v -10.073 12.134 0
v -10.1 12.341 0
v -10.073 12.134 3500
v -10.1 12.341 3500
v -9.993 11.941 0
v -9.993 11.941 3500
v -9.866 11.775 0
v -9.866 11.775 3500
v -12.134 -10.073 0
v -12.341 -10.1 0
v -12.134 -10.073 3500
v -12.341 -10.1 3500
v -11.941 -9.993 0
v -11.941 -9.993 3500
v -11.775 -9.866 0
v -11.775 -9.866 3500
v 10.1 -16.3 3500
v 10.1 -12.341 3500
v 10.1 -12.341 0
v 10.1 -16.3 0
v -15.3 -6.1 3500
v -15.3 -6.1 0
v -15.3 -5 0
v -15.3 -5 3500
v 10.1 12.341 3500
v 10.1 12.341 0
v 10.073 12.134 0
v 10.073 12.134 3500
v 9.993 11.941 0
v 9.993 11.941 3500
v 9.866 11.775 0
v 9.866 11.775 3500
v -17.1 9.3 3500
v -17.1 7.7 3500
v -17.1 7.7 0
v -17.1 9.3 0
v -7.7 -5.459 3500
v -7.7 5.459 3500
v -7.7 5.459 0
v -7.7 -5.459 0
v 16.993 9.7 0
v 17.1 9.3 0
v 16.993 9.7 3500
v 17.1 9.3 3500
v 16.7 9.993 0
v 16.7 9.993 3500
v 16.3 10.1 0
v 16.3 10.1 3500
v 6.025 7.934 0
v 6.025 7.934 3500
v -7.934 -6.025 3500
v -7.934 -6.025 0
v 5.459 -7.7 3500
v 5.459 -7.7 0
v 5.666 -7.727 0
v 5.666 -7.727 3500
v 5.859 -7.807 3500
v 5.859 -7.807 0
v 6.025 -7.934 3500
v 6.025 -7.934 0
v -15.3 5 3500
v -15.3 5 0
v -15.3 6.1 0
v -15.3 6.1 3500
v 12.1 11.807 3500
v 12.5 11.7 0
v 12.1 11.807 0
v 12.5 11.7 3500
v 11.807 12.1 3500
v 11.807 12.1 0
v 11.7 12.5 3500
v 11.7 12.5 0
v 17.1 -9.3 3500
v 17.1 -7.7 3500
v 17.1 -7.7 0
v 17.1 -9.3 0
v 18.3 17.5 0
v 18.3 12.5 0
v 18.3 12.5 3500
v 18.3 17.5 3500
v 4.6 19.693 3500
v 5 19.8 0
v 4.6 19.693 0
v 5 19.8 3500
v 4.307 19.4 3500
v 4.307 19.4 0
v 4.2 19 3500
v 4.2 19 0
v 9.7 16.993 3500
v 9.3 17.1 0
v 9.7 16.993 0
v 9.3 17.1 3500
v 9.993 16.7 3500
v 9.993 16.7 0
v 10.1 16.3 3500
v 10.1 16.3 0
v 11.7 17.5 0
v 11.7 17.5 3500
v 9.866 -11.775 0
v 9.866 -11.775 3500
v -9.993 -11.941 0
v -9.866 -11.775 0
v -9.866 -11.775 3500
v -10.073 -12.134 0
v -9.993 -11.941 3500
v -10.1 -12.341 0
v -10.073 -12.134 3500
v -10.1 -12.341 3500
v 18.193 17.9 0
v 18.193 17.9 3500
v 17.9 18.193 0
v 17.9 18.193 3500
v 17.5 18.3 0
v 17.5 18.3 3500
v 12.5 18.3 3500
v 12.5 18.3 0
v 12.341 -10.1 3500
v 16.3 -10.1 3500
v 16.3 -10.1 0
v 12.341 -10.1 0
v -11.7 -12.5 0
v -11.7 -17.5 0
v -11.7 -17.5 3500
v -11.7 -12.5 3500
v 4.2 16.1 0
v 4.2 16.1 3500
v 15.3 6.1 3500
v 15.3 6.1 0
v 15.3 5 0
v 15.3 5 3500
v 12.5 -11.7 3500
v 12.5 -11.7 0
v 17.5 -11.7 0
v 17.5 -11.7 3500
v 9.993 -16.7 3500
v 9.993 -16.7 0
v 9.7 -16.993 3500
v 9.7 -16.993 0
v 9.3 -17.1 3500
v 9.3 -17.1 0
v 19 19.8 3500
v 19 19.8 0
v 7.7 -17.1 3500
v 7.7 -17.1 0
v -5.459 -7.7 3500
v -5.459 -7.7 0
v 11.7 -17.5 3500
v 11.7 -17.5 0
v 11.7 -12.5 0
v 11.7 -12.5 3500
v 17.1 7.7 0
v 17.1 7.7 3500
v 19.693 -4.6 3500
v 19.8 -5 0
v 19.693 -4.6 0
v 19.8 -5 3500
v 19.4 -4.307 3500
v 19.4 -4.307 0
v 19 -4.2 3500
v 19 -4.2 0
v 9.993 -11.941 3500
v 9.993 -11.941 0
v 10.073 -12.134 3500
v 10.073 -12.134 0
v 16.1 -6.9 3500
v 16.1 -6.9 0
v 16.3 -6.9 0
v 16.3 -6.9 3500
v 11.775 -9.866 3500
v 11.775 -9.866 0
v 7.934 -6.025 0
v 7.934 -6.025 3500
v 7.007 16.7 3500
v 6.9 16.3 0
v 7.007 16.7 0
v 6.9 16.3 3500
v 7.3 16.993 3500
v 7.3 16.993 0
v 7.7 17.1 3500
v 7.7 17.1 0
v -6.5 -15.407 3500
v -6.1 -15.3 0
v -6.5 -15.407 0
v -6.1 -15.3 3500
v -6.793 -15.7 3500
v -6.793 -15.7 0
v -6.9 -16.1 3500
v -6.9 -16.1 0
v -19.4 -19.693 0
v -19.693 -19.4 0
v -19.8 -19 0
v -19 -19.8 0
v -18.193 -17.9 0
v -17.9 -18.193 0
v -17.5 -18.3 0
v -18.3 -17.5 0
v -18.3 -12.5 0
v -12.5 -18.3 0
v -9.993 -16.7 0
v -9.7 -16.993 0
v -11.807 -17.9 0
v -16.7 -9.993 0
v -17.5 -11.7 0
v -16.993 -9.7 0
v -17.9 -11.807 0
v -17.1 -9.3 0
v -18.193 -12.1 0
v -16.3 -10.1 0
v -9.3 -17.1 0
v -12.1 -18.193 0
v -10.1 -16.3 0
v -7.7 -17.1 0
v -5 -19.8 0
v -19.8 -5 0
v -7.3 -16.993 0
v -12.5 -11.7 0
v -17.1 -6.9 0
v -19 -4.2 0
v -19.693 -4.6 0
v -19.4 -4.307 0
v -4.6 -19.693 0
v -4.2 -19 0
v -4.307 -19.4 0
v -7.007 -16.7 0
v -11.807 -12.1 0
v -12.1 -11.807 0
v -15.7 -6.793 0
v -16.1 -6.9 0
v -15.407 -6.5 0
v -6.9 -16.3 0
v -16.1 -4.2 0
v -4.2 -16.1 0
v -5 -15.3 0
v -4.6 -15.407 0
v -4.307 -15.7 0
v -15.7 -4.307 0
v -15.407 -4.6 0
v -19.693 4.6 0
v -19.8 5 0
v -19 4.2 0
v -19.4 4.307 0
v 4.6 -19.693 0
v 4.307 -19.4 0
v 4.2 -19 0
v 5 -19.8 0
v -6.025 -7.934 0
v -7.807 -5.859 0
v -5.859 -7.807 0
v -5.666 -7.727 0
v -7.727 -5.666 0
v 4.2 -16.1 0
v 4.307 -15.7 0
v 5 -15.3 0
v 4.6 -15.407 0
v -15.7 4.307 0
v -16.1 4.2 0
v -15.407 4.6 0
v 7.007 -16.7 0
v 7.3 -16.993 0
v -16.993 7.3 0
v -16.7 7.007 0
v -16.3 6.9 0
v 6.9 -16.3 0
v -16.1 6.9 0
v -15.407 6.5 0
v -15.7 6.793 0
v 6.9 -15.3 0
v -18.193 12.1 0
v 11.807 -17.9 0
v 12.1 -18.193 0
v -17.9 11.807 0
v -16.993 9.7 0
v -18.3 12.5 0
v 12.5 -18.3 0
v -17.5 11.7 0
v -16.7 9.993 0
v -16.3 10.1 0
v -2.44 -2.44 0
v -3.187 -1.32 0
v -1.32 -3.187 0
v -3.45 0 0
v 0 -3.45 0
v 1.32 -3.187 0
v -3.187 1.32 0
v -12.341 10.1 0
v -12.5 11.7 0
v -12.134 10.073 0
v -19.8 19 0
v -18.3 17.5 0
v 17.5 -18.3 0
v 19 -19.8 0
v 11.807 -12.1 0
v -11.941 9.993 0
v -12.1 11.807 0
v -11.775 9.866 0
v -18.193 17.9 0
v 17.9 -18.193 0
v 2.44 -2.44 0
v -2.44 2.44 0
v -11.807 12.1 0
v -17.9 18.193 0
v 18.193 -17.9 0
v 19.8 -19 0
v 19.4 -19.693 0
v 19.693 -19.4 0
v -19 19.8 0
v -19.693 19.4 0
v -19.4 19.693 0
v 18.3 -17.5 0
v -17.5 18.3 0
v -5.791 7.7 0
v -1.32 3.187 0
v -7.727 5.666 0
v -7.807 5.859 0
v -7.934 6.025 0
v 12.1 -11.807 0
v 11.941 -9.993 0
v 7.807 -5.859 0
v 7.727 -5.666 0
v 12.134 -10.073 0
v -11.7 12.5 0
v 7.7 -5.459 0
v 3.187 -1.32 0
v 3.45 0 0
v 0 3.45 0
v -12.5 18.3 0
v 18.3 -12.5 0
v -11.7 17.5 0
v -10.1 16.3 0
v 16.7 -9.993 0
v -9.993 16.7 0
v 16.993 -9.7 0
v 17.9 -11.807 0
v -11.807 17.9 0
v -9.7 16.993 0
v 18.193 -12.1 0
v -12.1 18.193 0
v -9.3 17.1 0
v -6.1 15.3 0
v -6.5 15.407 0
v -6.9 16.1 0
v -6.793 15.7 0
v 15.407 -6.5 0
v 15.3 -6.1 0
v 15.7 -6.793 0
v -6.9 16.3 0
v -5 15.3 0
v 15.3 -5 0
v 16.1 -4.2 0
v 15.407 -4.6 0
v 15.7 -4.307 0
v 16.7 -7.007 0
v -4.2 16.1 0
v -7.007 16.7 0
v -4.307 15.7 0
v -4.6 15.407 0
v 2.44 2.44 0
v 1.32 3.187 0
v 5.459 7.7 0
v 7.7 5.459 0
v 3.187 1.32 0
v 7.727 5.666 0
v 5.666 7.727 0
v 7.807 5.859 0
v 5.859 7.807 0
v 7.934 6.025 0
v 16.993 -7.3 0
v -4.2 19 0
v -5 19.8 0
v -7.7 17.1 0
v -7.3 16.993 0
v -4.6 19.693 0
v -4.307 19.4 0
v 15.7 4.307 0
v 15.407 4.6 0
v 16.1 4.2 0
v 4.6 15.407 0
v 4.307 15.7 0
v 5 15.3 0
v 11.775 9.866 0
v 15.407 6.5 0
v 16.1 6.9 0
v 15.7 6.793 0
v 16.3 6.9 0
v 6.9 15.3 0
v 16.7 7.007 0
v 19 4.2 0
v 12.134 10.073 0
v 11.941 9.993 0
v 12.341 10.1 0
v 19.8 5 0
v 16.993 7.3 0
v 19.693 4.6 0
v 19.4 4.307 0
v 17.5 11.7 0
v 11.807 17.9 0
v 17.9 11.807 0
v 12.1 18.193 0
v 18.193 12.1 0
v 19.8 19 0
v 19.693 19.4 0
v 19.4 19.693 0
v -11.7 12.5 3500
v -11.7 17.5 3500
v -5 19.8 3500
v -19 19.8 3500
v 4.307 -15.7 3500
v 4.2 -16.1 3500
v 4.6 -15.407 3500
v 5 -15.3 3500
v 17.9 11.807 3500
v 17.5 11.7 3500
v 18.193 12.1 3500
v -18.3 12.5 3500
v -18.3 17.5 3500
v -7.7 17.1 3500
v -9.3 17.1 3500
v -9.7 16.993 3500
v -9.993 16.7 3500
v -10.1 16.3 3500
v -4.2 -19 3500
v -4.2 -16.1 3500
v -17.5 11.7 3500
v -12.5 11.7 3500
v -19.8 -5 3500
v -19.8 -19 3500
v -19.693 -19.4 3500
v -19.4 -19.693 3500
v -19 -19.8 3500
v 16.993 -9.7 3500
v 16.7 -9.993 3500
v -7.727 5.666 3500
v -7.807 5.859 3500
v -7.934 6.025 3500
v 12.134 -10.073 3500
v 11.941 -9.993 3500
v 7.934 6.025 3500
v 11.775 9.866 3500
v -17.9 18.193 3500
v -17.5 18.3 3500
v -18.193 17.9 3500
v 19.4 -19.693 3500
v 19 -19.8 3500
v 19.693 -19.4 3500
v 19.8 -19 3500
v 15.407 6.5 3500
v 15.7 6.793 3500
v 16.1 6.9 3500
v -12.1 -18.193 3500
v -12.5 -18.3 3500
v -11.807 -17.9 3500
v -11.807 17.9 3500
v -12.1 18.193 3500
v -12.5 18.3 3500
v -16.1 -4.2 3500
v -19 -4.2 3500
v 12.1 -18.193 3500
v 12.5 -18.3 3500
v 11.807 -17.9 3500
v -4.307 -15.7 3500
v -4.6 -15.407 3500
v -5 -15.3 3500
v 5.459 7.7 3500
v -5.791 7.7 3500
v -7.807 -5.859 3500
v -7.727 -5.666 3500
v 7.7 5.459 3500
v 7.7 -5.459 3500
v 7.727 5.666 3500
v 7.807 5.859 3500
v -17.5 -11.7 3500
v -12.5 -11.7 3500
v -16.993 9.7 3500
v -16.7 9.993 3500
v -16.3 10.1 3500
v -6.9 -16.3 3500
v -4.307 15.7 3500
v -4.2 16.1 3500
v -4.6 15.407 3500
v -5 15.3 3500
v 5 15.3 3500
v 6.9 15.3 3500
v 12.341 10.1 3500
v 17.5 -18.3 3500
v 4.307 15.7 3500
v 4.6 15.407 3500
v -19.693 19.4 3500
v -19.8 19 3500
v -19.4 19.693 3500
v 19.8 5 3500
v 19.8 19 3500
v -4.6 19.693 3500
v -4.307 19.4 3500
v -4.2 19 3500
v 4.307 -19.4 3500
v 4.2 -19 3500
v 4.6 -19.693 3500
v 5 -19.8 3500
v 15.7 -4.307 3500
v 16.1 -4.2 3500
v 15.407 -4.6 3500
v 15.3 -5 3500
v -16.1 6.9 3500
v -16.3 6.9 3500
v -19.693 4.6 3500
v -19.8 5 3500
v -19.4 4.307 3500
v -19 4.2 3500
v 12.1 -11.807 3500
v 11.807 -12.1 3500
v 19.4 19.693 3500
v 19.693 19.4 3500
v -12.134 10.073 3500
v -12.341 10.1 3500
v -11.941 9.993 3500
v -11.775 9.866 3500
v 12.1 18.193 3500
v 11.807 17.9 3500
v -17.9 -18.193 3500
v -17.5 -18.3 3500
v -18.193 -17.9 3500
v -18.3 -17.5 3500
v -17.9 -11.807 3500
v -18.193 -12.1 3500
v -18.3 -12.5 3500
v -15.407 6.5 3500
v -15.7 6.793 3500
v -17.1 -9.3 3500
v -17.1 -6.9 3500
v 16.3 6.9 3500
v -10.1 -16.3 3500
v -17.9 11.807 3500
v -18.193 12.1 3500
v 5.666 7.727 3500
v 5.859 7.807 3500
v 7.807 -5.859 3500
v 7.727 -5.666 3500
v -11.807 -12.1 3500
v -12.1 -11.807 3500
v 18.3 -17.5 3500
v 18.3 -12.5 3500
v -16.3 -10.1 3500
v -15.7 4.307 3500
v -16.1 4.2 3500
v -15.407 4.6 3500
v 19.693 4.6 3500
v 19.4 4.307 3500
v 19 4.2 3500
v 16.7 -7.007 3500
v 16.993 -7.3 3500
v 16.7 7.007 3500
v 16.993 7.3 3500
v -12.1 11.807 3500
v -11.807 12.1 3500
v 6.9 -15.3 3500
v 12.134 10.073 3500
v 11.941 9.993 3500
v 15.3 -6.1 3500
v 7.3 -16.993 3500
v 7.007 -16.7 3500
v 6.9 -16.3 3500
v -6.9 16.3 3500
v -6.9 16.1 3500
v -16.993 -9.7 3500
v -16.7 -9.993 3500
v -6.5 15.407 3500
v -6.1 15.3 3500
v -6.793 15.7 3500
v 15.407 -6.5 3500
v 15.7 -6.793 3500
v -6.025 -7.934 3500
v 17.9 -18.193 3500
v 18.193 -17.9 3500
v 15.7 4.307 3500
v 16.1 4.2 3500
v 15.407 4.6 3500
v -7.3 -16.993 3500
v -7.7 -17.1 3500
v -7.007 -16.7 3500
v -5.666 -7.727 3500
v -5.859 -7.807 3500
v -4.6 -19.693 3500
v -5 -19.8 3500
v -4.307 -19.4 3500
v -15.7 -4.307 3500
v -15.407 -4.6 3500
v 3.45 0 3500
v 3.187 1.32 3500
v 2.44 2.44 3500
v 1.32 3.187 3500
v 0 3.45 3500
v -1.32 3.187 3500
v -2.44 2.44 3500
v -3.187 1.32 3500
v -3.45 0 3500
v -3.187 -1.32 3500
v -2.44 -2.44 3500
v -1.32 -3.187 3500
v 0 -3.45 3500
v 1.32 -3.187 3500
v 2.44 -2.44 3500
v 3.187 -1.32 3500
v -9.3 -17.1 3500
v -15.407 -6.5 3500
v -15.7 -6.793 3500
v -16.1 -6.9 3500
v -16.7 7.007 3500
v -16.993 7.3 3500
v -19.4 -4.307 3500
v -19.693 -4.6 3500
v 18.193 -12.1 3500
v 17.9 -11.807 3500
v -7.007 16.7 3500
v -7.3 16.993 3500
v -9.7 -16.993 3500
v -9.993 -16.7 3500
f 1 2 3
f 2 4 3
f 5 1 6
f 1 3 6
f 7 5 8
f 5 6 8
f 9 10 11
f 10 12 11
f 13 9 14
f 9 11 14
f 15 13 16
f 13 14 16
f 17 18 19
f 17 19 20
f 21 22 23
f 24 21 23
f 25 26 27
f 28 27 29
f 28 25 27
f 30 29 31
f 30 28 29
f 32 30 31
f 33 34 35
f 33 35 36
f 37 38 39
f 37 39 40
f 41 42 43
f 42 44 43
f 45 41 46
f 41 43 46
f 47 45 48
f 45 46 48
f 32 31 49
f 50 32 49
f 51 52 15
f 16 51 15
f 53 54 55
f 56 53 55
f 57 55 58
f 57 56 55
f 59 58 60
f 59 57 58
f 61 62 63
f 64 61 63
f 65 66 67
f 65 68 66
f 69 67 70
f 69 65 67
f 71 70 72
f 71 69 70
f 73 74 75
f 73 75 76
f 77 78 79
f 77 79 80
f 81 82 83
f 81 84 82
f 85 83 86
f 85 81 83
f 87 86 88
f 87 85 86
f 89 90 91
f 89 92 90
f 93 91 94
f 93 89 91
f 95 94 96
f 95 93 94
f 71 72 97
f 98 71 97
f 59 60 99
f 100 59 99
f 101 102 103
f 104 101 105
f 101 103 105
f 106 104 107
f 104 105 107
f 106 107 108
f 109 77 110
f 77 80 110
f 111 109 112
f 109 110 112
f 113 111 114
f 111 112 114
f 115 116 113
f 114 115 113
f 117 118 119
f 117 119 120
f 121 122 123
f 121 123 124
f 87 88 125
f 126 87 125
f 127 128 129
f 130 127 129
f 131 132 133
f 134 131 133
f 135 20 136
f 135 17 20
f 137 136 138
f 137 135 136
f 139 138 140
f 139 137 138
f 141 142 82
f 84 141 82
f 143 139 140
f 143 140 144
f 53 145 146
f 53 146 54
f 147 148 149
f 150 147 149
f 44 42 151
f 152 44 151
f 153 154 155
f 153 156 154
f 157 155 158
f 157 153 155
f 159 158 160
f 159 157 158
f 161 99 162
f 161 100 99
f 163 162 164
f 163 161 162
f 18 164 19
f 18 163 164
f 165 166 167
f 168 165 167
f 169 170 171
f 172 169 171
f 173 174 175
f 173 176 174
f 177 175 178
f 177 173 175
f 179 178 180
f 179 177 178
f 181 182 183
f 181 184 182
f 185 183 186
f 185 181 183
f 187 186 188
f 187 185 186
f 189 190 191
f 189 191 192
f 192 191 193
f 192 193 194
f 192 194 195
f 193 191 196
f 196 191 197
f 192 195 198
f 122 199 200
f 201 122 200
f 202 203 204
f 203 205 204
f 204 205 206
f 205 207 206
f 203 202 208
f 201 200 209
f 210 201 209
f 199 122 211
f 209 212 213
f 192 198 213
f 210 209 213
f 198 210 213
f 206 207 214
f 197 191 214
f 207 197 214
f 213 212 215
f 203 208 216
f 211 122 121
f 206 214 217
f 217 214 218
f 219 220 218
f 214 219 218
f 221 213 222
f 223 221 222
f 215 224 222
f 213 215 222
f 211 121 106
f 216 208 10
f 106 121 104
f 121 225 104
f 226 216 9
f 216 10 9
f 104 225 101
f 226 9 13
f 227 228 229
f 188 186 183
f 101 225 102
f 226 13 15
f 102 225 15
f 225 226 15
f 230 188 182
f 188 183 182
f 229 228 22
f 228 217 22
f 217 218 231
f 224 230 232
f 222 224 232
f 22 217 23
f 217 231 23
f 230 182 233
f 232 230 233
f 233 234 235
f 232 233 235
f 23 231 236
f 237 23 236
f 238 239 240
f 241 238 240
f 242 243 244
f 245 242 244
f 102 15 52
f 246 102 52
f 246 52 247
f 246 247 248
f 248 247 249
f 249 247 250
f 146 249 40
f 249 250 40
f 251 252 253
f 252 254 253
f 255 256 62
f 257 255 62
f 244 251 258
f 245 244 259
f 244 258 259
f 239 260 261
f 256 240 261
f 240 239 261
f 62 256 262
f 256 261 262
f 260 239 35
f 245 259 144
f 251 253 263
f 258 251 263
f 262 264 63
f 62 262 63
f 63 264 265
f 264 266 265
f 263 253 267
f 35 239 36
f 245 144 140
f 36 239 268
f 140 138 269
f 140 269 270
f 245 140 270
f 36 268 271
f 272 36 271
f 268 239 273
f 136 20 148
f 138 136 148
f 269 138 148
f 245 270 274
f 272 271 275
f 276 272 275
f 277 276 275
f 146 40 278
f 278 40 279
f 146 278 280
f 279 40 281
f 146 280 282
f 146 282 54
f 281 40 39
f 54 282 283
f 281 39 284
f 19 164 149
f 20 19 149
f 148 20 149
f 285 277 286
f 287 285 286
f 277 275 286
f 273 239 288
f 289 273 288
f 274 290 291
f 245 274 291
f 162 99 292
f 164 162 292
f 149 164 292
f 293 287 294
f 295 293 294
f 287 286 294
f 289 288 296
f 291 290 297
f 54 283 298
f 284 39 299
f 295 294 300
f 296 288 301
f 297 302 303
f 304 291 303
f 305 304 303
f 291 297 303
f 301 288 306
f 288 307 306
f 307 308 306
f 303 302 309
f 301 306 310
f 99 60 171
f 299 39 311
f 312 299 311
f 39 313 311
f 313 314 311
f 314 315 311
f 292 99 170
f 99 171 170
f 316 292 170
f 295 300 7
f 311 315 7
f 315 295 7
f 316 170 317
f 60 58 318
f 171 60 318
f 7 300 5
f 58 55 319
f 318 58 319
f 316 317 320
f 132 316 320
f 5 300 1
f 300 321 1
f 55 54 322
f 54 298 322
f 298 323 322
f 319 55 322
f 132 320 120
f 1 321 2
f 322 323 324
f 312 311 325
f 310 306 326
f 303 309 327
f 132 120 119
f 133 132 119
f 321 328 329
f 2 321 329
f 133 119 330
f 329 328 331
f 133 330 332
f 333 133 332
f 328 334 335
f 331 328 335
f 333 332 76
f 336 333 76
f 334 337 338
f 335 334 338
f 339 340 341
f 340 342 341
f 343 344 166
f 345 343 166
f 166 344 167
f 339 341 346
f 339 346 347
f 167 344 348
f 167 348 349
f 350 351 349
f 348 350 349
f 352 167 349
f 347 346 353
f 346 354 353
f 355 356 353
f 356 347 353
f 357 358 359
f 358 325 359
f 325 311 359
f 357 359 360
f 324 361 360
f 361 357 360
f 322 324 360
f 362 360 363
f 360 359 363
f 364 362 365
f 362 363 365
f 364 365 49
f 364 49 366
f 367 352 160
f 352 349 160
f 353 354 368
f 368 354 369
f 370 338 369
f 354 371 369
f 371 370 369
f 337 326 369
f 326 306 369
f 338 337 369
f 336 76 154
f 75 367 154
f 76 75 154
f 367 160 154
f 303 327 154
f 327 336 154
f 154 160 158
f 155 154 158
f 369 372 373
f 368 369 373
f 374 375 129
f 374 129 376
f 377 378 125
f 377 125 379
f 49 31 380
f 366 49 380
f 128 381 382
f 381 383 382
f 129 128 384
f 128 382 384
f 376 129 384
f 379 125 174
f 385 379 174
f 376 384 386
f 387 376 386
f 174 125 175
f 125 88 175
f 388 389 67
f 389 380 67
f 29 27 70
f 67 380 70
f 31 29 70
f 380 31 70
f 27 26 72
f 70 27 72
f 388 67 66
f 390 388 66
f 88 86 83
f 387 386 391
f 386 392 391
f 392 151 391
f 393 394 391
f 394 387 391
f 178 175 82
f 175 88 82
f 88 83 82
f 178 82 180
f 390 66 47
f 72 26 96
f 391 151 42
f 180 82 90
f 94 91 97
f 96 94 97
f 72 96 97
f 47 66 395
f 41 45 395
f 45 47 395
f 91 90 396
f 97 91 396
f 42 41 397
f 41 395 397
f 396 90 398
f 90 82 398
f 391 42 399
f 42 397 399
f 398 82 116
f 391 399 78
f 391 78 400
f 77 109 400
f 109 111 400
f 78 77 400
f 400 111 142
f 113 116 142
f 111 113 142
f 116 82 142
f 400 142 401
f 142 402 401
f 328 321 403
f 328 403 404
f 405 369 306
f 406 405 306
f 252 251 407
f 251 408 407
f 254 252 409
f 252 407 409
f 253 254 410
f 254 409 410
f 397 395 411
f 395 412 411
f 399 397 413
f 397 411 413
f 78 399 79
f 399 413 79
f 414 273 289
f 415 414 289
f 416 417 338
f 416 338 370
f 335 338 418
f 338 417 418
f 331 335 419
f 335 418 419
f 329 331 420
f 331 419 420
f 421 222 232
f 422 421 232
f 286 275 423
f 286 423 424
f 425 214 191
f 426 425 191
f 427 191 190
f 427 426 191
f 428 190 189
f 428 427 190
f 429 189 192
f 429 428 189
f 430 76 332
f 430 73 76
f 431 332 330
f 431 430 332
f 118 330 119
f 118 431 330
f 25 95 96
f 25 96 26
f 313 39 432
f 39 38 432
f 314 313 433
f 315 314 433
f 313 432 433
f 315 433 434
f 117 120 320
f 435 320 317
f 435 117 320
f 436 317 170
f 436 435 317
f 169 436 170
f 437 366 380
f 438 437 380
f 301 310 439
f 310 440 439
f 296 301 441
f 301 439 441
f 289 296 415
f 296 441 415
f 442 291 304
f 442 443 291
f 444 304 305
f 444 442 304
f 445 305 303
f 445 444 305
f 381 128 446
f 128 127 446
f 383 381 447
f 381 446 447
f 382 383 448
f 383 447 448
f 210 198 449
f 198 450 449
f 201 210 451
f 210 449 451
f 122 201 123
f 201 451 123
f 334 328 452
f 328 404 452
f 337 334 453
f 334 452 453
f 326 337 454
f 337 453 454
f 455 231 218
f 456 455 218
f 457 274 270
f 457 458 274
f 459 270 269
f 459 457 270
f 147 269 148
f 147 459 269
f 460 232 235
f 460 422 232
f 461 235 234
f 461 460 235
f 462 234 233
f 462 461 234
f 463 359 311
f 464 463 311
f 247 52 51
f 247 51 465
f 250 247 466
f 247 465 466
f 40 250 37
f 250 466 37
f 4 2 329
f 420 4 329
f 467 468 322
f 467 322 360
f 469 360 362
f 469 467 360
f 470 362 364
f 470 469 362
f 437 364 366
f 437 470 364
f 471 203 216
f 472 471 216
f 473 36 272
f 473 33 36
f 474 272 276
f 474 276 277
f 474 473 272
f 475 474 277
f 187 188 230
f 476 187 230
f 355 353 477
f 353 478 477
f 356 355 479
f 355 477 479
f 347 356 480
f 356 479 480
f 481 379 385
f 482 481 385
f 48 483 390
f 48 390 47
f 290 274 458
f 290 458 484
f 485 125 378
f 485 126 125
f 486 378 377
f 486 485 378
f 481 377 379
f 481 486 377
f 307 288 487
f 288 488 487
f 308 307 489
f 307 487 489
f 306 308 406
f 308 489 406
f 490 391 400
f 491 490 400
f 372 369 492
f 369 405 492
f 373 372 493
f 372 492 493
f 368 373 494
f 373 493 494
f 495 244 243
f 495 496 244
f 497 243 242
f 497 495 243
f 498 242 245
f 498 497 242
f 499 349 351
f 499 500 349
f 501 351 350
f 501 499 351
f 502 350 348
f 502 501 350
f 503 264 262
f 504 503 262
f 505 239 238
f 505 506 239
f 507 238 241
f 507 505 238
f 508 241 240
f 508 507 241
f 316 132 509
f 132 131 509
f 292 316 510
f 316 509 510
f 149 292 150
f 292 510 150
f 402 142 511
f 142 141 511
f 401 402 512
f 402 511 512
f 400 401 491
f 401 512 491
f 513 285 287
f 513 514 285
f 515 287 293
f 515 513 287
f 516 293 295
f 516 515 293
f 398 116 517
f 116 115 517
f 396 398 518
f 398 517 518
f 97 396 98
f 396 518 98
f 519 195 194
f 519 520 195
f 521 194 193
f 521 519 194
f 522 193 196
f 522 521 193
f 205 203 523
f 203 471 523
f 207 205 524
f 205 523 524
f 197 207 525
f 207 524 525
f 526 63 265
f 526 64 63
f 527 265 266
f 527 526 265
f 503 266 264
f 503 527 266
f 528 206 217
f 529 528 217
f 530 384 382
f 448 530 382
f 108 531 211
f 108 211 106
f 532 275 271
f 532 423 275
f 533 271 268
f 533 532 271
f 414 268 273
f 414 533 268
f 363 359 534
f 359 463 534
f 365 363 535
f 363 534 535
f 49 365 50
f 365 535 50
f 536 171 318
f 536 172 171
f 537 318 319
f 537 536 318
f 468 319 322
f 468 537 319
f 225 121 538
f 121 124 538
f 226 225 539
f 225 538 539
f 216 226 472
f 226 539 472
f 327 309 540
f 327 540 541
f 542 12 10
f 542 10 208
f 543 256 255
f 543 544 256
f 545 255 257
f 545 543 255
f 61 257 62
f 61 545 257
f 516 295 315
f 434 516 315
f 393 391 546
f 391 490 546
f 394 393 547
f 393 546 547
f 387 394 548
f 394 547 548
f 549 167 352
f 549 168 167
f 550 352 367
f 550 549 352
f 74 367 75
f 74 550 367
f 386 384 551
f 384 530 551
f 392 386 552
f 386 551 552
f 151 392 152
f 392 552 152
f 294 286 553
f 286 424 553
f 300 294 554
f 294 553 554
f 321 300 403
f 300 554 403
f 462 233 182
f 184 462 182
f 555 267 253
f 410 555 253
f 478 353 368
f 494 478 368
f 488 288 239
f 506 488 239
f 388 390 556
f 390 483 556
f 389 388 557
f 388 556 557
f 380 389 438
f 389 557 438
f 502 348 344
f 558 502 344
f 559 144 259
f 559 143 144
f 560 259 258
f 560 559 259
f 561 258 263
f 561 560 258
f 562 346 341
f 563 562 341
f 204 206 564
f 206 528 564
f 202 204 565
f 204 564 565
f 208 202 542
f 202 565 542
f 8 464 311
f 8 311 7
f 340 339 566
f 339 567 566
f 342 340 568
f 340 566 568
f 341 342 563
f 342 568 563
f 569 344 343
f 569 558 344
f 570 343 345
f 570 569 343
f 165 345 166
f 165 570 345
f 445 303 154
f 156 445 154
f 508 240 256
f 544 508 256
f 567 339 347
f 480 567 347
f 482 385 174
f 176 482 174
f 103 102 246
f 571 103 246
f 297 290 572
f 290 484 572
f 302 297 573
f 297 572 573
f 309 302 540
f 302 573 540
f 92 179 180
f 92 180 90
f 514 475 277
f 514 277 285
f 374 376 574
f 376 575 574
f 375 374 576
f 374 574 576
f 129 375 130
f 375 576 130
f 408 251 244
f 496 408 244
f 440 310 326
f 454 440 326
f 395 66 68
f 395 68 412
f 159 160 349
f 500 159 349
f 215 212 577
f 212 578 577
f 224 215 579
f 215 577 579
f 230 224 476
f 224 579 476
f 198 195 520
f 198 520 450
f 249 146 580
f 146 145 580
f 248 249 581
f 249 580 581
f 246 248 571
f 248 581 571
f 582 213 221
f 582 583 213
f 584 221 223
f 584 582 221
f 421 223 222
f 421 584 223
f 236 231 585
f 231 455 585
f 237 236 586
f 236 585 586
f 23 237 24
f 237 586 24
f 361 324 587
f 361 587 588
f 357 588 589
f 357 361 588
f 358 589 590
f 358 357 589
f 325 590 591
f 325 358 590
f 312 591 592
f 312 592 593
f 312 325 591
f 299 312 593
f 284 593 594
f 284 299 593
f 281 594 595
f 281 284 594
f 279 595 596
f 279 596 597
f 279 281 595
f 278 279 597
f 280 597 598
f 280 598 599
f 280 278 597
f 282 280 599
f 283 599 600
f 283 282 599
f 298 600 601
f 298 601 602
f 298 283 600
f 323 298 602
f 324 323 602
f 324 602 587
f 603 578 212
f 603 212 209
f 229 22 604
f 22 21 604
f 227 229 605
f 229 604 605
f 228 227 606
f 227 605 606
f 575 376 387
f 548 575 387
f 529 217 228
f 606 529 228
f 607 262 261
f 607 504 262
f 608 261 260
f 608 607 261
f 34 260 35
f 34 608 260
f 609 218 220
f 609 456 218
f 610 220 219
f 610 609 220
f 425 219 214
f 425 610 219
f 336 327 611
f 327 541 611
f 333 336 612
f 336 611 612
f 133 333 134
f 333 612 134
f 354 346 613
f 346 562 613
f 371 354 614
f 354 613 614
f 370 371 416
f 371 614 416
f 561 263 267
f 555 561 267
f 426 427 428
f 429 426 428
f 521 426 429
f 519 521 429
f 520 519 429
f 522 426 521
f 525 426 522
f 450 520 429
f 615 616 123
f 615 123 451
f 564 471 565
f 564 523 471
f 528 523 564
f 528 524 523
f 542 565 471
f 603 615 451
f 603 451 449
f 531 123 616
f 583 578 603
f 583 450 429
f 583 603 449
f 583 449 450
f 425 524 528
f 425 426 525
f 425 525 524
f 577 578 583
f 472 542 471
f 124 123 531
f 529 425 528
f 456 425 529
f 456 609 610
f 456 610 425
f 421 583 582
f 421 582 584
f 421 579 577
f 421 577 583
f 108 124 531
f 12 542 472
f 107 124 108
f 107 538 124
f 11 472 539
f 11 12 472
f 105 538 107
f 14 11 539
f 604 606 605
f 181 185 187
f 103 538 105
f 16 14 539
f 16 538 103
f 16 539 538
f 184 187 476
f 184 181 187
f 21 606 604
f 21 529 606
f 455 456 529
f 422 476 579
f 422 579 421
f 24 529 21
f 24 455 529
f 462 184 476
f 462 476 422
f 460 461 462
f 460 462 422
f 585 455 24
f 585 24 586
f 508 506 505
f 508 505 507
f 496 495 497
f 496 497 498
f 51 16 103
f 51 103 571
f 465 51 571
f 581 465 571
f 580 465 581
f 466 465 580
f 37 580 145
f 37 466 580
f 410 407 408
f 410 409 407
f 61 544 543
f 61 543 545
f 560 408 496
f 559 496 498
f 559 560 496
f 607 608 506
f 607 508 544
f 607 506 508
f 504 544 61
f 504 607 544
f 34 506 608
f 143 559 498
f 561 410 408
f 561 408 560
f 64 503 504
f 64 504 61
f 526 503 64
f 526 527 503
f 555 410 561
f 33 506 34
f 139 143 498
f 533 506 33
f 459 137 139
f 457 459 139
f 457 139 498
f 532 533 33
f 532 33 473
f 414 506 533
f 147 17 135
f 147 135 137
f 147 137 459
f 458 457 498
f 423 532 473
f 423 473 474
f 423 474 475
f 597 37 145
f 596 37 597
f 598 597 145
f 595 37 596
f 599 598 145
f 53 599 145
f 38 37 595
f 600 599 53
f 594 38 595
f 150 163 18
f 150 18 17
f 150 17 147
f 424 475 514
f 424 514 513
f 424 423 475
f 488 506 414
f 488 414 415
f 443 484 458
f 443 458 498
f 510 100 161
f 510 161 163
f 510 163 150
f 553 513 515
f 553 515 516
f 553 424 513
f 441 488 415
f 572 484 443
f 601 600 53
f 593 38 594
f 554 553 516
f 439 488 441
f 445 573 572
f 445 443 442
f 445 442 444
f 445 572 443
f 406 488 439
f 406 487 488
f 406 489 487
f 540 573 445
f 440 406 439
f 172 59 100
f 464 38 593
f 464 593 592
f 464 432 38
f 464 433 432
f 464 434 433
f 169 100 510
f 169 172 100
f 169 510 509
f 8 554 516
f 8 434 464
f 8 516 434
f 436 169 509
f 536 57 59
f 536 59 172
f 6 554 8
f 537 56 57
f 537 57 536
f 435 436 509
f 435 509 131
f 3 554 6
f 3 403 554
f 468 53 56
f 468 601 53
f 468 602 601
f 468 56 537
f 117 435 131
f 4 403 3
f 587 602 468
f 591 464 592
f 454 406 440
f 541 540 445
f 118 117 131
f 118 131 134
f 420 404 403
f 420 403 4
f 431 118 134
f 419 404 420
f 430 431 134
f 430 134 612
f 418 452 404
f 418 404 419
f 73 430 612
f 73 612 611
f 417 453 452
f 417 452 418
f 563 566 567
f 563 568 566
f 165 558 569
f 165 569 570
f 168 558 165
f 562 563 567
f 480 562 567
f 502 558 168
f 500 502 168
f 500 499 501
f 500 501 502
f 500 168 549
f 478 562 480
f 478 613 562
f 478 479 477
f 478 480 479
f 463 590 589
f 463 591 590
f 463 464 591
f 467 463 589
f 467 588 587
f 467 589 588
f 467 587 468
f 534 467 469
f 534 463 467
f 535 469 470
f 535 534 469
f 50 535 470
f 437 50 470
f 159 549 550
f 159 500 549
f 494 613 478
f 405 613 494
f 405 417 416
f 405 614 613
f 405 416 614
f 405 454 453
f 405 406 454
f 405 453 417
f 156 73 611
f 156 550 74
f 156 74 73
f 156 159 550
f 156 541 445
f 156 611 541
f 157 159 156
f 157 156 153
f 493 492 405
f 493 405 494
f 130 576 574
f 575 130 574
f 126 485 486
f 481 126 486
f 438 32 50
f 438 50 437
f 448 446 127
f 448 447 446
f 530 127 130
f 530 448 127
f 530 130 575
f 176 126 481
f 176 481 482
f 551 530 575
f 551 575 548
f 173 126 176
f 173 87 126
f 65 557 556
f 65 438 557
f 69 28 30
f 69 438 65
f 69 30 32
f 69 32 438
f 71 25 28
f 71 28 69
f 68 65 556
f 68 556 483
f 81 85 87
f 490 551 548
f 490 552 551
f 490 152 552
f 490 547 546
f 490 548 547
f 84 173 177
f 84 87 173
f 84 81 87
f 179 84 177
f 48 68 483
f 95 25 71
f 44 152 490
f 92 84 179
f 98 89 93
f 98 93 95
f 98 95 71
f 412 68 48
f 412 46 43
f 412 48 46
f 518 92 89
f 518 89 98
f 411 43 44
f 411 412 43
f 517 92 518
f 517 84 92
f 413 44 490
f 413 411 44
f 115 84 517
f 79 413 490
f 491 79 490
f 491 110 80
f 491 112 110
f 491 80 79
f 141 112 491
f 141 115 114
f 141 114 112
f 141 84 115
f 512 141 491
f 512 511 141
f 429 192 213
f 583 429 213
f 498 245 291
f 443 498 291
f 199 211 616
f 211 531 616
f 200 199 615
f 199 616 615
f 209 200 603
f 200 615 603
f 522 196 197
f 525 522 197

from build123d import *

# Parameters (mm, degrees)
SKETCH1_W           = 6.6
SKETCH1_H           = 6.6
SKETCH1_R           = 3.45
BOSS_EXTRUDE3_DEPTH = 3500
FILLET1_R           = 0.8


with BuildPart() as part:
    # Sketch1 → Boss-Extrude3 (new body)
    # profile 1 of 9: a face of its own
    with BuildSketch(Plane.XY):
        Polygon((19.8, 19.8), (4.2, 19.8), (4.2, 15.3), (6.9, 15.3), (6.9, 17.1), (10.1, 17.1), (10.1, 12.009188309), (5.790811691, 7.7), (7.7, 7.7), (7.7, 5.790811691), (12.009188309, 10.1), (17.1, 10.1), (17.1, 6.9), (15.3, 6.9), (15.3, 4.2), (19.8, 4.2), align=None)
        with Locations((15, 15)):
            Rectangle(SKETCH1_W, SKETCH1_H, mode=Mode.SUBTRACT)
    # profile 2 of 9: a face of its own
    with BuildSketch(Plane.XY):
        Polygon((4.2, -15.3), (4.2, -19.8), (19.8, -19.8), (19.8, -4.2), (15.3, -4.2), (15.3, -6.9), (17.1, -6.9), (17.1, -10.1), (12.009188309, -10.1), (7.7, -5.790811691), (7.7, -7.7), (5.790811691, -7.7), (10.1, -12.009188309), (10.1, -17.1), (6.9, -17.1), (6.9, -15.3), align=None)
        with Locations((15, -15)):
            Rectangle(SKETCH1_W, SKETCH1_H, mode=Mode.SUBTRACT)
    # profile 3 of 9: a face of its own
    with BuildSketch(Plane.XY):
        Polygon((-15.3, -4.2), (-19.8, -4.2), (-19.8, -19.8), (-4.2, -19.8), (-4.2, -15.3), (-6.9, -15.3), (-6.9, -17.1), (-10.1, -17.1), (-10.1, -12.009188309), (-5.790811691, -7.7), (-7.7, -7.7), (-7.7, -5.790811691), (-12.009188309, -10.1), (-17.1, -10.1), (-17.1, -6.9), (-15.3, -6.9), align=None)
        with Locations((-15, -15)):
            Rectangle(SKETCH1_W, SKETCH1_H, mode=Mode.SUBTRACT)
    # profile 4 of 9: a face of its own
    with BuildSketch(Plane.XY):
        Polygon((-19.8, 19.8), (-19.8, 4.2), (-15.3, 4.2), (-15.3, 6.9), (-17.1, 6.9), (-17.1, 10.1), (-12.009188309, 10.1), (-7.7, 5.790811691), (-7.7, 7.7), (-5.790811691, 7.7), (-10.1, 12.009188309), (-10.1, 17.1), (-6.9, 17.1), (-6.9, 15.3), (-4.2, 15.3), (-4.2, 19.8), align=None)
        with Locations((-15, 15)):
            Rectangle(SKETCH1_W, SKETCH1_H, mode=Mode.SUBTRACT)
    # profile 5 of 9: a face of its own
    with BuildSketch(Plane.XY):
        Polygon((7.7, -5.790811691), (7.7, 5.790811691), (5.27, 3.360811691), (5.27, 0), (5.27, -3.360811691), align=None)
    # profile 6 of 9: a face of its own
    with BuildSketch(Plane.XY):
        Polygon((-7.7, 7.7), (-7.7, 5.790811691), (-5.27, 3.360811691), (-5.27, 0), (-5.27, -3.360811691), (-7.7, -5.790811691), (-7.7, -7.7), (-5.790811691, -7.7), (-3.360811691, -5.27), (0, -5.27), (3.360811691, -5.27), (5.790811691, -7.7), (7.7, -7.7), (7.7, -5.790811691), (5.27, -3.360811691), (5.27, 0), (5.27, 3.360811691), (7.7, 5.790811691), (7.7, 7.7), (5.790811691, 7.7), (3.360811691, 5.27), (0, 5.27), (-3.360811691, 5.27), (-5.790811691, 7.7), align=None)
        Circle(SKETCH1_R, mode=Mode.SUBTRACT)
    # profile 7 of 9: a face of its own
    with BuildSketch(Plane.XY):
        Polygon((5.790811691, 7.7), (-5.790811691, 7.7), (-3.360811691, 5.27), (0, 5.27), (3.360811691, 5.27), align=None)
    # profile 8 of 9: a face of its own
    with BuildSketch(Plane.XY):
        Polygon((-5.27, 3.360811691), (-7.7, 5.790811691), (-7.7, -5.790811691), (-5.27, -3.360811691), (-5.27, 0), align=None)
    # profile 9 of 9: a face of its own
    with BuildSketch(Plane.XY):
        Polygon((-3.360811691, -5.27), (-5.790811691, -7.7), (5.790811691, -7.7), (3.360811691, -5.27), (0, -5.27), align=None)
    extrude(amount=BOSS_EXTRUDE3_DEPTH)

    # Fillet1
    fillet1_edges = [part.edges().sort_by_distance(p)[0] for p in [
        (-11.7, -11.7, 1750),
        (-18.3, -11.7, 1750),
        (-18.3, -18.3, 1750),
        (-11.7, -18.3, 1750),
        (11.7, -11.7, 1750),
        (11.7, -18.3, 1750),
        (18.3, -18.3, 1750),
        (18.3, -11.7, 1750),
        (-18.3, 18.3, 1750),
        (-18.3, 11.7, 1750),
        (-11.7, 11.7, 1750),
        (-11.7, 18.3, 1750),
        (11.7, 11.7, 1750),
        (18.3, 11.7, 1750),
        (18.3, 18.3, 1750),
        (11.7, 18.3, 1750),
        (-7.7, 5.790811691, 1750),
        (-12.009188309, 10.1, 1750),
        (-17.1, 10.1, 1750),
        (-17.1, 6.9, 1750),
        (-15.3, 6.9, 1750),
        (-15.3, 4.2, 1750),
        (-19.8, 4.2, 1750),
        (-19.8, 19.8, 1750),
        (-4.2, 19.8, 1750),
        (-4.2, 15.3, 1750),
        (-6.9, 15.3, 1750),
        (-6.9, 17.1, 1750),
        (-10.1, 17.1, 1750),
        (-10.1, 12.009188309, 1750),
        (5.790811691, 7.7, 1750),
        (10.1, 12.009188309, 1750),
        (10.1, 17.1, 1750),
        (6.9, 17.1, 1750),
        (4.2, 15.3, 1750),
        (4.2, 19.8, 1750),
        (19.8, 19.8, 1750),
        (19.8, 4.2, 1750),
        (15.3, 4.2, 1750),
        (15.3, 6.9, 1750),
        (17.1, 6.9, 1750),
        (17.1, 10.1, 1750),
        (12.009188309, 10.1, 1750),
        (7.7, 5.790811691, 1750),
        (7.7, -5.790811691, 1750),
        (12.009188309, -10.1, 1750),
        (17.1, -10.1, 1750),
        (17.1, -6.9, 1750),
        (15.3, -6.9, 1750),
        (15.3, -4.2, 1750),
        (19.8, -4.2, 1750),
        (19.8, -19.8, 1750),
        (4.2, -19.8, 1750),
        (4.2, -15.3, 1750),
        (6.9, -17.1, 1750),
        (10.1, -17.1, 1750),
        (10.1, -12.009188309, 1750),
        (5.790811691, -7.7, 1750),
        (-5.790811691, -7.7, 1750),
        (-10.1, -12.009188309, 1750),
        (-10.1, -17.1, 1750),
        (-6.9, -17.1, 1750),
        (-6.9, -15.3, 1750),
        (-4.2, -15.3, 1750),
        (-4.2, -19.8, 1750),
        (-19.8, -19.8, 1750),
        (-19.8, -4.2, 1750),
        (-15.3, -4.2, 1750),
        (-15.3, -6.9, 1750),
        (-17.1, -10.1, 1750),
        (-12.009188309, -10.1, 1750),
        (-7.7, -5.790811691, 1750),
    ]]
    fillet(fillet1_edges, radius=FILLET1_R)


solid = part.part
